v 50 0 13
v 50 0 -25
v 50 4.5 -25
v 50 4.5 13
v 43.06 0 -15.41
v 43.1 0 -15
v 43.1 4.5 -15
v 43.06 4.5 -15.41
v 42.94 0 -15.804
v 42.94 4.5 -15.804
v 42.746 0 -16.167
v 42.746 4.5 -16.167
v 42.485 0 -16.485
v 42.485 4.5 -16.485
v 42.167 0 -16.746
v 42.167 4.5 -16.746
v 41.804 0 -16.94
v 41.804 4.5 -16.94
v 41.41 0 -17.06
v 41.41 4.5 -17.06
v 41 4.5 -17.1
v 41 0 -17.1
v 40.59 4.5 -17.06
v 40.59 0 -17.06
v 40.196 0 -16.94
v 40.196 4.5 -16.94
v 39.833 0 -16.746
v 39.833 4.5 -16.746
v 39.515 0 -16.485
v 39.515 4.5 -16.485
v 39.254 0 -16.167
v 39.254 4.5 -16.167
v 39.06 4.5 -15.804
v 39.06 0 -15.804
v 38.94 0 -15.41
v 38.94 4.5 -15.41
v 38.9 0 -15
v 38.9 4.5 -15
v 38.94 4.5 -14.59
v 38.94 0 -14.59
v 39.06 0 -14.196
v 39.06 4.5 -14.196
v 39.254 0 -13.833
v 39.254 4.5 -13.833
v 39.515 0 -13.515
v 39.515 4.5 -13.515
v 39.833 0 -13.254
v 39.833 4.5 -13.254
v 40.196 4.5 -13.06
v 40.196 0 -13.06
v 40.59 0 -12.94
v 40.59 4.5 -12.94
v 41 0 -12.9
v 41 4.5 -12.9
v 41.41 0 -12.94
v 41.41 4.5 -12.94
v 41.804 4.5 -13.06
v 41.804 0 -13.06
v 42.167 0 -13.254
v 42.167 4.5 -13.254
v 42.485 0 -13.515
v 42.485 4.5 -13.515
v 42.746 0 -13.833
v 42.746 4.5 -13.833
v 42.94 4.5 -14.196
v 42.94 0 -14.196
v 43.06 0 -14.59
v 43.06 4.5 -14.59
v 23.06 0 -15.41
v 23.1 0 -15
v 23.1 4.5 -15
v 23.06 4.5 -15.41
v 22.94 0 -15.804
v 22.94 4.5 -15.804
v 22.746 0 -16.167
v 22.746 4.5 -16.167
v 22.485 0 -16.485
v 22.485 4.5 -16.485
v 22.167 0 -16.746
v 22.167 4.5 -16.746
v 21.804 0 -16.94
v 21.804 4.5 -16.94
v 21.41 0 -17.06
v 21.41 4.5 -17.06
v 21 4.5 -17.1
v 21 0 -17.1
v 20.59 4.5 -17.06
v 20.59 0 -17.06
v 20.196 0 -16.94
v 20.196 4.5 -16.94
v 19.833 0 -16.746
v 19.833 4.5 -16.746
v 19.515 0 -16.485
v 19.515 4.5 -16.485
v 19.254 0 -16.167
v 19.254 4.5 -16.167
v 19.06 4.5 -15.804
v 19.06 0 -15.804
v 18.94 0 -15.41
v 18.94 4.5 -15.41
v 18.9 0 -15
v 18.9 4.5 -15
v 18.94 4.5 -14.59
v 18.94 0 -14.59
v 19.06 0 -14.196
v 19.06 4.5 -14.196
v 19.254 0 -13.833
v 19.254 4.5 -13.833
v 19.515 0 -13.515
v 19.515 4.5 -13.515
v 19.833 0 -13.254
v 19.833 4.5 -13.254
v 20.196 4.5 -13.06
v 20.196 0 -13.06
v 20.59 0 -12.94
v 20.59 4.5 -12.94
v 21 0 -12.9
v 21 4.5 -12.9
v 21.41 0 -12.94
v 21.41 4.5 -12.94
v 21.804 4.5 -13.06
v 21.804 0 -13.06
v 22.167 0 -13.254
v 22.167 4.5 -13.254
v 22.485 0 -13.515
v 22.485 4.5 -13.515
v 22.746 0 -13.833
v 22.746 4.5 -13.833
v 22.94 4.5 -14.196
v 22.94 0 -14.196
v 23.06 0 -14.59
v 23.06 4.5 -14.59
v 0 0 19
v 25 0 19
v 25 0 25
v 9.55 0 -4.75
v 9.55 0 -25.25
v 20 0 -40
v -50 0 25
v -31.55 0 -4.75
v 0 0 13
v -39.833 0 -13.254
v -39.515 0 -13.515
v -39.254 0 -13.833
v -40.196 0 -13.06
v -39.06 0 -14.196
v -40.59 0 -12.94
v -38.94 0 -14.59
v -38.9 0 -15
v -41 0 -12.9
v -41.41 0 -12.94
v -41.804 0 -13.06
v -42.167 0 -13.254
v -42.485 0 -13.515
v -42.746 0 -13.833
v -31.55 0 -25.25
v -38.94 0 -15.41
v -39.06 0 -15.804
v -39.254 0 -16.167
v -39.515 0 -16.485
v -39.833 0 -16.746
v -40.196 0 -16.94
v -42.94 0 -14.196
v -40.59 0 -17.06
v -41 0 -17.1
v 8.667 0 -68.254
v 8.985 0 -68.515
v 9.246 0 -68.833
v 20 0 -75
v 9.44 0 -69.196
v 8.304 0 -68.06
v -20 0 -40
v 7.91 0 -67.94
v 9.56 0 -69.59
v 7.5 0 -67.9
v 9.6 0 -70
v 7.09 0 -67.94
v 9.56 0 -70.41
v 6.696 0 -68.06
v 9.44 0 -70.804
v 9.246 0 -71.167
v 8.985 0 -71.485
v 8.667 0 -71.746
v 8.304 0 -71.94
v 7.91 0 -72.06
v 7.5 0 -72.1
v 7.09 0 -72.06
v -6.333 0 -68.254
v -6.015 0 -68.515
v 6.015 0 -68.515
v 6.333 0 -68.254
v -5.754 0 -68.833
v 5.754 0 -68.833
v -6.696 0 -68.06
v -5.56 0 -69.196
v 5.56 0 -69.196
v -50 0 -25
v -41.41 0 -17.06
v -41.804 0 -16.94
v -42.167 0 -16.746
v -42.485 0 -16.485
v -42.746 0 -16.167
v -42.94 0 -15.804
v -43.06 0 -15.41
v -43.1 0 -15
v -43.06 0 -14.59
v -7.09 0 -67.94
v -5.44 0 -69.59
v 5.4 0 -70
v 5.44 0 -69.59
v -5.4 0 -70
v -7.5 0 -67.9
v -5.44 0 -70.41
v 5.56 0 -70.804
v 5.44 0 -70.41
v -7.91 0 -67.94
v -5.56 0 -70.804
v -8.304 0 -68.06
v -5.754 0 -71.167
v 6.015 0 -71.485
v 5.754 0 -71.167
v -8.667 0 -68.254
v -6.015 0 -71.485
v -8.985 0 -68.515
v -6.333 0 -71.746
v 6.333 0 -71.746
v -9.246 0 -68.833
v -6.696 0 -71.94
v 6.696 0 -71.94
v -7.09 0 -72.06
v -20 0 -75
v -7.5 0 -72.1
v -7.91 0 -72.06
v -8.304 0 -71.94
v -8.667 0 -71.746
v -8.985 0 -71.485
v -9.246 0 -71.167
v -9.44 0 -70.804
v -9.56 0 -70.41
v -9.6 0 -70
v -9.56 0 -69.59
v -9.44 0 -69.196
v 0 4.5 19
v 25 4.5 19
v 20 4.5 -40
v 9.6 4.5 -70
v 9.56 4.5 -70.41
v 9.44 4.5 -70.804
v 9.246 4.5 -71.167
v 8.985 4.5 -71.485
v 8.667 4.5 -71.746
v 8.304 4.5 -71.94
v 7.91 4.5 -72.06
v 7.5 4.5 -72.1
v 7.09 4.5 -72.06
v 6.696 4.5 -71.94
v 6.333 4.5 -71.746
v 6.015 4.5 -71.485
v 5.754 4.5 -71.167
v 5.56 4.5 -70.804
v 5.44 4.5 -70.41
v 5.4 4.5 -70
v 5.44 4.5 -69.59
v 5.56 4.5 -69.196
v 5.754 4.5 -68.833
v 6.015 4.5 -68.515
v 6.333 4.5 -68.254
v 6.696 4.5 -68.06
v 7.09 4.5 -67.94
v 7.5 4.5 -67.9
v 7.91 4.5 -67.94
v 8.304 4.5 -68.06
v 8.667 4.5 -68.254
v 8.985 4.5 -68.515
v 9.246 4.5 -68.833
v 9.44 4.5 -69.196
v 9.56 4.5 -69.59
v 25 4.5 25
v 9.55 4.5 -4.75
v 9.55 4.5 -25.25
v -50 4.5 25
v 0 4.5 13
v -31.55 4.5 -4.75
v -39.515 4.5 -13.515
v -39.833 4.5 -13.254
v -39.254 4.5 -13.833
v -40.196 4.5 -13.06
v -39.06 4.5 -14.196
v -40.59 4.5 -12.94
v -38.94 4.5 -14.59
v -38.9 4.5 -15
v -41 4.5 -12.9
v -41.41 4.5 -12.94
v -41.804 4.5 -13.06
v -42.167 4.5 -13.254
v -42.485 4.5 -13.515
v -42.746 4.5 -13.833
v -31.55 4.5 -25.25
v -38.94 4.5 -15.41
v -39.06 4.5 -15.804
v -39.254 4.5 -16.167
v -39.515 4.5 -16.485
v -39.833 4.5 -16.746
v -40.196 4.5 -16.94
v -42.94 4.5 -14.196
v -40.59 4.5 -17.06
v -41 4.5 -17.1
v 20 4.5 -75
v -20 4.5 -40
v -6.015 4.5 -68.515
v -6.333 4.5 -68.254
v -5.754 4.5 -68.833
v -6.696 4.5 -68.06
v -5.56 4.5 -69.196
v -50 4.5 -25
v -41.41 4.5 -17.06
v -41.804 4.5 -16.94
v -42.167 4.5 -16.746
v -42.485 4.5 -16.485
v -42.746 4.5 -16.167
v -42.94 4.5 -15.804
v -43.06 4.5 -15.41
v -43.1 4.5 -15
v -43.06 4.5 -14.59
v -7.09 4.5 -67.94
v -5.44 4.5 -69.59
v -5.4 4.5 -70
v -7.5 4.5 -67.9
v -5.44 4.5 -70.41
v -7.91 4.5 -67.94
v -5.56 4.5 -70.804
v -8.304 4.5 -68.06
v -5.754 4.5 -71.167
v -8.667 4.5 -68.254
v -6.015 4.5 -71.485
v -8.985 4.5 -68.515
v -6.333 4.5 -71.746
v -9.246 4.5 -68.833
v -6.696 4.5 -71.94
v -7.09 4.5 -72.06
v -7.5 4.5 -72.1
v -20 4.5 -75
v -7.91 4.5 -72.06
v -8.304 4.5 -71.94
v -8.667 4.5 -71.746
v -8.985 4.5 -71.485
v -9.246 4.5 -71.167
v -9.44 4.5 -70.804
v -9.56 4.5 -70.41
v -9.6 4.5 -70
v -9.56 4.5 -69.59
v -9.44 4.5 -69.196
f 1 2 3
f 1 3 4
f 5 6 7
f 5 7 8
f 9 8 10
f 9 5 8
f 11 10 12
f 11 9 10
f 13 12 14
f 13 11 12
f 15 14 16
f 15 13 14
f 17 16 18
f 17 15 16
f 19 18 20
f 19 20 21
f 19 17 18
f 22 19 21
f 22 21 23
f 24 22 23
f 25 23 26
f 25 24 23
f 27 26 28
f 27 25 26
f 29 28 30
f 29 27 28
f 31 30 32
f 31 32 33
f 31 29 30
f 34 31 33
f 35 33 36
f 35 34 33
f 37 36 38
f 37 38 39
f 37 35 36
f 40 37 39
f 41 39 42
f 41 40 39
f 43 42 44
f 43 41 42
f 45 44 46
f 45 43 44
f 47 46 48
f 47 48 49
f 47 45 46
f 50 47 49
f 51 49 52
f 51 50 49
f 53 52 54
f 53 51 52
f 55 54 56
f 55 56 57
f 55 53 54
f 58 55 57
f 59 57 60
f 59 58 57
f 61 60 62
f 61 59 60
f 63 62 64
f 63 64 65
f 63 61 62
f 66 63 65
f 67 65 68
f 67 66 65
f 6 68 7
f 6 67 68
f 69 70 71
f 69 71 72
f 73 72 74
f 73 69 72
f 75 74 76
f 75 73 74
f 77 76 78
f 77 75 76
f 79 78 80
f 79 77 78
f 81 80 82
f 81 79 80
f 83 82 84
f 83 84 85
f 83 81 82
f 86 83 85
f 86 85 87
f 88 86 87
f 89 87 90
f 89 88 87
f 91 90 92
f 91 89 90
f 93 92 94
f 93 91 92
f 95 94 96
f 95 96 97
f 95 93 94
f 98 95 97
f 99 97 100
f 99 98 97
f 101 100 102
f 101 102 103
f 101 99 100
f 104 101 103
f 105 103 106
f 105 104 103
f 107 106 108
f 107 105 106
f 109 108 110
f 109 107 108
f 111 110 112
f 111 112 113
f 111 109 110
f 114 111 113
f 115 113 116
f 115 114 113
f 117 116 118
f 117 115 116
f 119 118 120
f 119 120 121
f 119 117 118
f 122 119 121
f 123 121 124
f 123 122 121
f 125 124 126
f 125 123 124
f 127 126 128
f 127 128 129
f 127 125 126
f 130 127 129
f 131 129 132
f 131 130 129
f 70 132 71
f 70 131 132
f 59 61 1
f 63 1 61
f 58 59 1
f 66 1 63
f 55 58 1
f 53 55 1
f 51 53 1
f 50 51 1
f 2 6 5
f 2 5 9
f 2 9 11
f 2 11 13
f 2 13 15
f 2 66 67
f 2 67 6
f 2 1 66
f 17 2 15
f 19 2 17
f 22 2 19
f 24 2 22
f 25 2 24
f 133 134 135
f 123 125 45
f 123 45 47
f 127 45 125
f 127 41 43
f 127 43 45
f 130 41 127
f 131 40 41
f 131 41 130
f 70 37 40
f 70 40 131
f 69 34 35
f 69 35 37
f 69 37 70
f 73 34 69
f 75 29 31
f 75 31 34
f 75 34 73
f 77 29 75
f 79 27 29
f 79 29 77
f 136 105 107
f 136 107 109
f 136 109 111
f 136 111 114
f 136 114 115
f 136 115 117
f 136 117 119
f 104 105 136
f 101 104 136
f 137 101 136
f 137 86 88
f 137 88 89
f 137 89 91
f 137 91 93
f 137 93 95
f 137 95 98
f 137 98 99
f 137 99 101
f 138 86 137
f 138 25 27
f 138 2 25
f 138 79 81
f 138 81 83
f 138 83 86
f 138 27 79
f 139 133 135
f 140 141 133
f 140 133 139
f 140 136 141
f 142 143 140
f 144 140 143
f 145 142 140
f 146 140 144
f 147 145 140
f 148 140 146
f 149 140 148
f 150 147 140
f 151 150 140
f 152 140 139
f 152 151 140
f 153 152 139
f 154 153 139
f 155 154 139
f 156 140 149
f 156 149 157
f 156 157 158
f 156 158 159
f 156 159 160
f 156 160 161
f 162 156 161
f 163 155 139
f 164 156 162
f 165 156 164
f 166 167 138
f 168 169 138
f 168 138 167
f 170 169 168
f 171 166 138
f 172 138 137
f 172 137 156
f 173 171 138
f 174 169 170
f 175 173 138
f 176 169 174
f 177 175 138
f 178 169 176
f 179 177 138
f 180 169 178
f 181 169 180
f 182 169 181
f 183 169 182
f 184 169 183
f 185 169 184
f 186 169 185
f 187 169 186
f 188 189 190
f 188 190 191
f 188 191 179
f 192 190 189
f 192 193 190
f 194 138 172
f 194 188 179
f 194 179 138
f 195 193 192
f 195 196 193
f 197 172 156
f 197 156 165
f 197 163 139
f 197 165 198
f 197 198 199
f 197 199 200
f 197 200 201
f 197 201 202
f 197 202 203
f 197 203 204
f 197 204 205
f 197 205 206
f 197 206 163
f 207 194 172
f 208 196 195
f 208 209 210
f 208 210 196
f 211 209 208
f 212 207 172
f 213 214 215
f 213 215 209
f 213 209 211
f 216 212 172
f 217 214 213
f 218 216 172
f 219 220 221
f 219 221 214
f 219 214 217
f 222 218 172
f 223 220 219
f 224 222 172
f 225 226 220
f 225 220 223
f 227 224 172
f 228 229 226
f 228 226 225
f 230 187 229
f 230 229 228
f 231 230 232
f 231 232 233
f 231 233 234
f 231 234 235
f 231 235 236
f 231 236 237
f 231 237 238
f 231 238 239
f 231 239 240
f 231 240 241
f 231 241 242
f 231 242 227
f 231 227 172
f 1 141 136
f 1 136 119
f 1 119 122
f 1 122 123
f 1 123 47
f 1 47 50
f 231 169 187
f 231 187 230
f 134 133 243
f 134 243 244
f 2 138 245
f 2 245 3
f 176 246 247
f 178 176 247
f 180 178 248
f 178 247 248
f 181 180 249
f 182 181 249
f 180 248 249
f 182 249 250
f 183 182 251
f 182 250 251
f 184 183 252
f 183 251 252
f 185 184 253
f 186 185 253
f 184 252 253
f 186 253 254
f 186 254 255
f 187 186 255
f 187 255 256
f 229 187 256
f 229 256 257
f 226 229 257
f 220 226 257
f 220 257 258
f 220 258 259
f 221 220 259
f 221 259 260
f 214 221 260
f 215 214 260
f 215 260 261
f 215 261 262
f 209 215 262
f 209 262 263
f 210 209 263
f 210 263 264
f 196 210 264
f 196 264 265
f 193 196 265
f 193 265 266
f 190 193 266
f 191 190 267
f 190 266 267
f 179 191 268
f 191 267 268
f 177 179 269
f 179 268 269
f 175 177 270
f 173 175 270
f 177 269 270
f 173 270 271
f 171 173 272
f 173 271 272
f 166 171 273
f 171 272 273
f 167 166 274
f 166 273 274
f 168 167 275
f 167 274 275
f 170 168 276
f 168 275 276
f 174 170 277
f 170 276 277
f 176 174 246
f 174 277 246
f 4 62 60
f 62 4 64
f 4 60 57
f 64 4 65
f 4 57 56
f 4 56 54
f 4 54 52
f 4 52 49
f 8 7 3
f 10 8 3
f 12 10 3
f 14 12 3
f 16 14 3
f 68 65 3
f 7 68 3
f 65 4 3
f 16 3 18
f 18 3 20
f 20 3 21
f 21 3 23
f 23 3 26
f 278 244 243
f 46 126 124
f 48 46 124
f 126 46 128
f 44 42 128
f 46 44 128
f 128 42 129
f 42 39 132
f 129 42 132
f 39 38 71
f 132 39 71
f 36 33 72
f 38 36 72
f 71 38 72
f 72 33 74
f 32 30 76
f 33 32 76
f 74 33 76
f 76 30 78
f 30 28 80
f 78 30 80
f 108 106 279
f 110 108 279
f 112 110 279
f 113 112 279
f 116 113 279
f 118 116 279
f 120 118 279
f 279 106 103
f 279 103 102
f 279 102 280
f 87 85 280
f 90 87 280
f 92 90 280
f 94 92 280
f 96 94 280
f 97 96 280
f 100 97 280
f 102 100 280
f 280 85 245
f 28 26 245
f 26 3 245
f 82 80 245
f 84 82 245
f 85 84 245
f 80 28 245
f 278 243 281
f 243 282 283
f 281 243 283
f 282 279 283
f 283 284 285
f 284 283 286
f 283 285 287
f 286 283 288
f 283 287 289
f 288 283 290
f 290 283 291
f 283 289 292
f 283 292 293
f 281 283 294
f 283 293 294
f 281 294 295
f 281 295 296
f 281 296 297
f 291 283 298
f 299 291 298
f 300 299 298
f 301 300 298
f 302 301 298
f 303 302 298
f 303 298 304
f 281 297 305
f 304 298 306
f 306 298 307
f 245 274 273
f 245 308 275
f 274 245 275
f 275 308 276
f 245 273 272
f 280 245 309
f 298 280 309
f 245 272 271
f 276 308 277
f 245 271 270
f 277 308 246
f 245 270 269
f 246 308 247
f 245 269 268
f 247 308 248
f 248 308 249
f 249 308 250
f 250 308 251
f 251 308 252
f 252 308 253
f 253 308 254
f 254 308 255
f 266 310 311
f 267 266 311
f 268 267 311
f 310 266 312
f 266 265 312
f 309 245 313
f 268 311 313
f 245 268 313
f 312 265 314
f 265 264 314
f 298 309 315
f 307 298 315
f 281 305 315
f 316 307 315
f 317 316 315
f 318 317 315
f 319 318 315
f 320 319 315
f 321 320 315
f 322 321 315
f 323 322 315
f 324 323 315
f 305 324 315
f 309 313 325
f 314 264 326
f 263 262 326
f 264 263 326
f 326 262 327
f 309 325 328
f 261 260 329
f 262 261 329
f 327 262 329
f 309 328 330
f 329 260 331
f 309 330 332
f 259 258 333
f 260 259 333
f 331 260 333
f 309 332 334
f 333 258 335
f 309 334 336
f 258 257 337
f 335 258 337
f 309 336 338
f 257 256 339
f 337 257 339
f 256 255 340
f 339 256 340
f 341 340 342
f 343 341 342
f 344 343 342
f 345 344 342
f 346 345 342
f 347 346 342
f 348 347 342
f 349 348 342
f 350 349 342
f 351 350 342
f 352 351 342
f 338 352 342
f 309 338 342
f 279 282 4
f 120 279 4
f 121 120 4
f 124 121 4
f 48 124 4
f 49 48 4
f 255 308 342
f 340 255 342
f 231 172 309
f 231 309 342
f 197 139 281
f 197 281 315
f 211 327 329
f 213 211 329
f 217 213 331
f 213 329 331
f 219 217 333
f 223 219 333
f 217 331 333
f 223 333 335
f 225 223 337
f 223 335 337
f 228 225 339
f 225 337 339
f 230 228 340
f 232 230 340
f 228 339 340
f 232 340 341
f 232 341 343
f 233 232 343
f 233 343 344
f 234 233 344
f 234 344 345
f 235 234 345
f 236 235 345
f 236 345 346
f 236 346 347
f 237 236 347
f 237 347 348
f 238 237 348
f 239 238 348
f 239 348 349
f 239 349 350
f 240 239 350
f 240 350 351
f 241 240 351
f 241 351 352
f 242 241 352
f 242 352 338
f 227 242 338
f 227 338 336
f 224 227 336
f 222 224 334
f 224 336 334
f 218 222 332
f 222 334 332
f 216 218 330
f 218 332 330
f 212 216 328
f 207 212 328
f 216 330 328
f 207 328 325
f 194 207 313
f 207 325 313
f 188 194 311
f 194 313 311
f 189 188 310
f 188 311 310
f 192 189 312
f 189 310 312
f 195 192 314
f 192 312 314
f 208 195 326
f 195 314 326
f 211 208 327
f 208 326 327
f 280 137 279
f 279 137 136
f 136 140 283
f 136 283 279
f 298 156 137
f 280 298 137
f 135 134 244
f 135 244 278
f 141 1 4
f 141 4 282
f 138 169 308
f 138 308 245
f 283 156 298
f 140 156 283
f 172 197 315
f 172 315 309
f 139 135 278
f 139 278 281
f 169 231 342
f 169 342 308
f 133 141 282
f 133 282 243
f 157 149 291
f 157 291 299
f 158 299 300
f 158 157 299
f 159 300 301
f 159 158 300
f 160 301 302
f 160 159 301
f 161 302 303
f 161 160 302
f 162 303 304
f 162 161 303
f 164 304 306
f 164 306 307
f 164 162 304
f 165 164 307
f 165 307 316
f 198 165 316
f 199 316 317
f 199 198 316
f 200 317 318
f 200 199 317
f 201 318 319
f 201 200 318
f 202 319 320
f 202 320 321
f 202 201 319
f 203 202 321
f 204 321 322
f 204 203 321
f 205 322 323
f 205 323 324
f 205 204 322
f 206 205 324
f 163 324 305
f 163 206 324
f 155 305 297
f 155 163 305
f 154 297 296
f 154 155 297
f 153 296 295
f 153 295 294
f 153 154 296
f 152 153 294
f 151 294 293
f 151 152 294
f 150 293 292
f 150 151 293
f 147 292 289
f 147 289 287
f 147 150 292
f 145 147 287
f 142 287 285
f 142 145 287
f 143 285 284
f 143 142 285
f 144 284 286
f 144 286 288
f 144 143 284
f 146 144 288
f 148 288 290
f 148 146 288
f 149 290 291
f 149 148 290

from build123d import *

# Parameters (mm, degrees)
SKETCH1_R           = 2.1
BOSS_EXTRUDE1_DEPTH = 4.5
SKETCH2_W           = 41.1
SKETCH2_H           = 20.5
CUT_EXTRUDE1_DEPTH  = 10
CUT_EXTRUDE2_DEPTH  = 10
SKETCH4_R           = 2.1
CUT_EXTRUDE3_DEPTH  = 10


with BuildPart() as part:
    # Sketch1 → Boss-Extrude1 (new body)
    with BuildSketch(Plane(origin=(0, 0, 0), x_dir=(1, 0, 0), z_dir=(0, 1, 0))):
        Polygon((20, 40), (50, 25), (50, -25), (-50, -25), (-50, 25), (-20, 40), (-20, 75), (20, 75), align=None)
        with Locations((-41, 15)):
            Circle(SKETCH1_R, mode=Mode.SUBTRACT)
        with Locations((41, 15)):
            Circle(SKETCH1_R, mode=Mode.SUBTRACT)
        with Locations((-21, 15)):
            Circle(SKETCH1_R, mode=Mode.SUBTRACT)
        with Locations((21, 15)):
            Circle(SKETCH1_R, mode=Mode.SUBTRACT)
    extrude(amount=BOSS_EXTRUDE1_DEPTH)

    # Sketch2 → Cut-Extrude1 (cut)
    with BuildSketch(Plane.XZ):
        with Locations((-11, -15)):
            Rectangle(SKETCH2_W, SKETCH2_H)
    extrude(amount=-CUT_EXTRUDE1_DEPTH, mode=Mode.SUBTRACT)

    # Sketch3 → Cut-Extrude2 (cut)
    with BuildSketch(Plane.XZ):
        Polygon((0, 19), (25, 19), (25, 28.725277581), (50, 28.725277581), (50, 19), (50, 13), (0, 13), align=None)
    extrude(amount=-CUT_EXTRUDE2_DEPTH, mode=Mode.SUBTRACT)

    # Sketch4 → Cut-Extrude3 (cut)
    with BuildSketch(Plane(origin=(0, 4.5, 0), x_dir=(1, 0, 0), z_dir=(0, 1, 0))):
        with Locations((7.5, 70)):
            Circle(SKETCH4_R)
        with Locations((-7.5, 70)):
            Circle(SKETCH4_R)
    extrude(amount=-CUT_EXTRUDE3_DEPTH, mode=Mode.SUBTRACT)


solid = part.part
